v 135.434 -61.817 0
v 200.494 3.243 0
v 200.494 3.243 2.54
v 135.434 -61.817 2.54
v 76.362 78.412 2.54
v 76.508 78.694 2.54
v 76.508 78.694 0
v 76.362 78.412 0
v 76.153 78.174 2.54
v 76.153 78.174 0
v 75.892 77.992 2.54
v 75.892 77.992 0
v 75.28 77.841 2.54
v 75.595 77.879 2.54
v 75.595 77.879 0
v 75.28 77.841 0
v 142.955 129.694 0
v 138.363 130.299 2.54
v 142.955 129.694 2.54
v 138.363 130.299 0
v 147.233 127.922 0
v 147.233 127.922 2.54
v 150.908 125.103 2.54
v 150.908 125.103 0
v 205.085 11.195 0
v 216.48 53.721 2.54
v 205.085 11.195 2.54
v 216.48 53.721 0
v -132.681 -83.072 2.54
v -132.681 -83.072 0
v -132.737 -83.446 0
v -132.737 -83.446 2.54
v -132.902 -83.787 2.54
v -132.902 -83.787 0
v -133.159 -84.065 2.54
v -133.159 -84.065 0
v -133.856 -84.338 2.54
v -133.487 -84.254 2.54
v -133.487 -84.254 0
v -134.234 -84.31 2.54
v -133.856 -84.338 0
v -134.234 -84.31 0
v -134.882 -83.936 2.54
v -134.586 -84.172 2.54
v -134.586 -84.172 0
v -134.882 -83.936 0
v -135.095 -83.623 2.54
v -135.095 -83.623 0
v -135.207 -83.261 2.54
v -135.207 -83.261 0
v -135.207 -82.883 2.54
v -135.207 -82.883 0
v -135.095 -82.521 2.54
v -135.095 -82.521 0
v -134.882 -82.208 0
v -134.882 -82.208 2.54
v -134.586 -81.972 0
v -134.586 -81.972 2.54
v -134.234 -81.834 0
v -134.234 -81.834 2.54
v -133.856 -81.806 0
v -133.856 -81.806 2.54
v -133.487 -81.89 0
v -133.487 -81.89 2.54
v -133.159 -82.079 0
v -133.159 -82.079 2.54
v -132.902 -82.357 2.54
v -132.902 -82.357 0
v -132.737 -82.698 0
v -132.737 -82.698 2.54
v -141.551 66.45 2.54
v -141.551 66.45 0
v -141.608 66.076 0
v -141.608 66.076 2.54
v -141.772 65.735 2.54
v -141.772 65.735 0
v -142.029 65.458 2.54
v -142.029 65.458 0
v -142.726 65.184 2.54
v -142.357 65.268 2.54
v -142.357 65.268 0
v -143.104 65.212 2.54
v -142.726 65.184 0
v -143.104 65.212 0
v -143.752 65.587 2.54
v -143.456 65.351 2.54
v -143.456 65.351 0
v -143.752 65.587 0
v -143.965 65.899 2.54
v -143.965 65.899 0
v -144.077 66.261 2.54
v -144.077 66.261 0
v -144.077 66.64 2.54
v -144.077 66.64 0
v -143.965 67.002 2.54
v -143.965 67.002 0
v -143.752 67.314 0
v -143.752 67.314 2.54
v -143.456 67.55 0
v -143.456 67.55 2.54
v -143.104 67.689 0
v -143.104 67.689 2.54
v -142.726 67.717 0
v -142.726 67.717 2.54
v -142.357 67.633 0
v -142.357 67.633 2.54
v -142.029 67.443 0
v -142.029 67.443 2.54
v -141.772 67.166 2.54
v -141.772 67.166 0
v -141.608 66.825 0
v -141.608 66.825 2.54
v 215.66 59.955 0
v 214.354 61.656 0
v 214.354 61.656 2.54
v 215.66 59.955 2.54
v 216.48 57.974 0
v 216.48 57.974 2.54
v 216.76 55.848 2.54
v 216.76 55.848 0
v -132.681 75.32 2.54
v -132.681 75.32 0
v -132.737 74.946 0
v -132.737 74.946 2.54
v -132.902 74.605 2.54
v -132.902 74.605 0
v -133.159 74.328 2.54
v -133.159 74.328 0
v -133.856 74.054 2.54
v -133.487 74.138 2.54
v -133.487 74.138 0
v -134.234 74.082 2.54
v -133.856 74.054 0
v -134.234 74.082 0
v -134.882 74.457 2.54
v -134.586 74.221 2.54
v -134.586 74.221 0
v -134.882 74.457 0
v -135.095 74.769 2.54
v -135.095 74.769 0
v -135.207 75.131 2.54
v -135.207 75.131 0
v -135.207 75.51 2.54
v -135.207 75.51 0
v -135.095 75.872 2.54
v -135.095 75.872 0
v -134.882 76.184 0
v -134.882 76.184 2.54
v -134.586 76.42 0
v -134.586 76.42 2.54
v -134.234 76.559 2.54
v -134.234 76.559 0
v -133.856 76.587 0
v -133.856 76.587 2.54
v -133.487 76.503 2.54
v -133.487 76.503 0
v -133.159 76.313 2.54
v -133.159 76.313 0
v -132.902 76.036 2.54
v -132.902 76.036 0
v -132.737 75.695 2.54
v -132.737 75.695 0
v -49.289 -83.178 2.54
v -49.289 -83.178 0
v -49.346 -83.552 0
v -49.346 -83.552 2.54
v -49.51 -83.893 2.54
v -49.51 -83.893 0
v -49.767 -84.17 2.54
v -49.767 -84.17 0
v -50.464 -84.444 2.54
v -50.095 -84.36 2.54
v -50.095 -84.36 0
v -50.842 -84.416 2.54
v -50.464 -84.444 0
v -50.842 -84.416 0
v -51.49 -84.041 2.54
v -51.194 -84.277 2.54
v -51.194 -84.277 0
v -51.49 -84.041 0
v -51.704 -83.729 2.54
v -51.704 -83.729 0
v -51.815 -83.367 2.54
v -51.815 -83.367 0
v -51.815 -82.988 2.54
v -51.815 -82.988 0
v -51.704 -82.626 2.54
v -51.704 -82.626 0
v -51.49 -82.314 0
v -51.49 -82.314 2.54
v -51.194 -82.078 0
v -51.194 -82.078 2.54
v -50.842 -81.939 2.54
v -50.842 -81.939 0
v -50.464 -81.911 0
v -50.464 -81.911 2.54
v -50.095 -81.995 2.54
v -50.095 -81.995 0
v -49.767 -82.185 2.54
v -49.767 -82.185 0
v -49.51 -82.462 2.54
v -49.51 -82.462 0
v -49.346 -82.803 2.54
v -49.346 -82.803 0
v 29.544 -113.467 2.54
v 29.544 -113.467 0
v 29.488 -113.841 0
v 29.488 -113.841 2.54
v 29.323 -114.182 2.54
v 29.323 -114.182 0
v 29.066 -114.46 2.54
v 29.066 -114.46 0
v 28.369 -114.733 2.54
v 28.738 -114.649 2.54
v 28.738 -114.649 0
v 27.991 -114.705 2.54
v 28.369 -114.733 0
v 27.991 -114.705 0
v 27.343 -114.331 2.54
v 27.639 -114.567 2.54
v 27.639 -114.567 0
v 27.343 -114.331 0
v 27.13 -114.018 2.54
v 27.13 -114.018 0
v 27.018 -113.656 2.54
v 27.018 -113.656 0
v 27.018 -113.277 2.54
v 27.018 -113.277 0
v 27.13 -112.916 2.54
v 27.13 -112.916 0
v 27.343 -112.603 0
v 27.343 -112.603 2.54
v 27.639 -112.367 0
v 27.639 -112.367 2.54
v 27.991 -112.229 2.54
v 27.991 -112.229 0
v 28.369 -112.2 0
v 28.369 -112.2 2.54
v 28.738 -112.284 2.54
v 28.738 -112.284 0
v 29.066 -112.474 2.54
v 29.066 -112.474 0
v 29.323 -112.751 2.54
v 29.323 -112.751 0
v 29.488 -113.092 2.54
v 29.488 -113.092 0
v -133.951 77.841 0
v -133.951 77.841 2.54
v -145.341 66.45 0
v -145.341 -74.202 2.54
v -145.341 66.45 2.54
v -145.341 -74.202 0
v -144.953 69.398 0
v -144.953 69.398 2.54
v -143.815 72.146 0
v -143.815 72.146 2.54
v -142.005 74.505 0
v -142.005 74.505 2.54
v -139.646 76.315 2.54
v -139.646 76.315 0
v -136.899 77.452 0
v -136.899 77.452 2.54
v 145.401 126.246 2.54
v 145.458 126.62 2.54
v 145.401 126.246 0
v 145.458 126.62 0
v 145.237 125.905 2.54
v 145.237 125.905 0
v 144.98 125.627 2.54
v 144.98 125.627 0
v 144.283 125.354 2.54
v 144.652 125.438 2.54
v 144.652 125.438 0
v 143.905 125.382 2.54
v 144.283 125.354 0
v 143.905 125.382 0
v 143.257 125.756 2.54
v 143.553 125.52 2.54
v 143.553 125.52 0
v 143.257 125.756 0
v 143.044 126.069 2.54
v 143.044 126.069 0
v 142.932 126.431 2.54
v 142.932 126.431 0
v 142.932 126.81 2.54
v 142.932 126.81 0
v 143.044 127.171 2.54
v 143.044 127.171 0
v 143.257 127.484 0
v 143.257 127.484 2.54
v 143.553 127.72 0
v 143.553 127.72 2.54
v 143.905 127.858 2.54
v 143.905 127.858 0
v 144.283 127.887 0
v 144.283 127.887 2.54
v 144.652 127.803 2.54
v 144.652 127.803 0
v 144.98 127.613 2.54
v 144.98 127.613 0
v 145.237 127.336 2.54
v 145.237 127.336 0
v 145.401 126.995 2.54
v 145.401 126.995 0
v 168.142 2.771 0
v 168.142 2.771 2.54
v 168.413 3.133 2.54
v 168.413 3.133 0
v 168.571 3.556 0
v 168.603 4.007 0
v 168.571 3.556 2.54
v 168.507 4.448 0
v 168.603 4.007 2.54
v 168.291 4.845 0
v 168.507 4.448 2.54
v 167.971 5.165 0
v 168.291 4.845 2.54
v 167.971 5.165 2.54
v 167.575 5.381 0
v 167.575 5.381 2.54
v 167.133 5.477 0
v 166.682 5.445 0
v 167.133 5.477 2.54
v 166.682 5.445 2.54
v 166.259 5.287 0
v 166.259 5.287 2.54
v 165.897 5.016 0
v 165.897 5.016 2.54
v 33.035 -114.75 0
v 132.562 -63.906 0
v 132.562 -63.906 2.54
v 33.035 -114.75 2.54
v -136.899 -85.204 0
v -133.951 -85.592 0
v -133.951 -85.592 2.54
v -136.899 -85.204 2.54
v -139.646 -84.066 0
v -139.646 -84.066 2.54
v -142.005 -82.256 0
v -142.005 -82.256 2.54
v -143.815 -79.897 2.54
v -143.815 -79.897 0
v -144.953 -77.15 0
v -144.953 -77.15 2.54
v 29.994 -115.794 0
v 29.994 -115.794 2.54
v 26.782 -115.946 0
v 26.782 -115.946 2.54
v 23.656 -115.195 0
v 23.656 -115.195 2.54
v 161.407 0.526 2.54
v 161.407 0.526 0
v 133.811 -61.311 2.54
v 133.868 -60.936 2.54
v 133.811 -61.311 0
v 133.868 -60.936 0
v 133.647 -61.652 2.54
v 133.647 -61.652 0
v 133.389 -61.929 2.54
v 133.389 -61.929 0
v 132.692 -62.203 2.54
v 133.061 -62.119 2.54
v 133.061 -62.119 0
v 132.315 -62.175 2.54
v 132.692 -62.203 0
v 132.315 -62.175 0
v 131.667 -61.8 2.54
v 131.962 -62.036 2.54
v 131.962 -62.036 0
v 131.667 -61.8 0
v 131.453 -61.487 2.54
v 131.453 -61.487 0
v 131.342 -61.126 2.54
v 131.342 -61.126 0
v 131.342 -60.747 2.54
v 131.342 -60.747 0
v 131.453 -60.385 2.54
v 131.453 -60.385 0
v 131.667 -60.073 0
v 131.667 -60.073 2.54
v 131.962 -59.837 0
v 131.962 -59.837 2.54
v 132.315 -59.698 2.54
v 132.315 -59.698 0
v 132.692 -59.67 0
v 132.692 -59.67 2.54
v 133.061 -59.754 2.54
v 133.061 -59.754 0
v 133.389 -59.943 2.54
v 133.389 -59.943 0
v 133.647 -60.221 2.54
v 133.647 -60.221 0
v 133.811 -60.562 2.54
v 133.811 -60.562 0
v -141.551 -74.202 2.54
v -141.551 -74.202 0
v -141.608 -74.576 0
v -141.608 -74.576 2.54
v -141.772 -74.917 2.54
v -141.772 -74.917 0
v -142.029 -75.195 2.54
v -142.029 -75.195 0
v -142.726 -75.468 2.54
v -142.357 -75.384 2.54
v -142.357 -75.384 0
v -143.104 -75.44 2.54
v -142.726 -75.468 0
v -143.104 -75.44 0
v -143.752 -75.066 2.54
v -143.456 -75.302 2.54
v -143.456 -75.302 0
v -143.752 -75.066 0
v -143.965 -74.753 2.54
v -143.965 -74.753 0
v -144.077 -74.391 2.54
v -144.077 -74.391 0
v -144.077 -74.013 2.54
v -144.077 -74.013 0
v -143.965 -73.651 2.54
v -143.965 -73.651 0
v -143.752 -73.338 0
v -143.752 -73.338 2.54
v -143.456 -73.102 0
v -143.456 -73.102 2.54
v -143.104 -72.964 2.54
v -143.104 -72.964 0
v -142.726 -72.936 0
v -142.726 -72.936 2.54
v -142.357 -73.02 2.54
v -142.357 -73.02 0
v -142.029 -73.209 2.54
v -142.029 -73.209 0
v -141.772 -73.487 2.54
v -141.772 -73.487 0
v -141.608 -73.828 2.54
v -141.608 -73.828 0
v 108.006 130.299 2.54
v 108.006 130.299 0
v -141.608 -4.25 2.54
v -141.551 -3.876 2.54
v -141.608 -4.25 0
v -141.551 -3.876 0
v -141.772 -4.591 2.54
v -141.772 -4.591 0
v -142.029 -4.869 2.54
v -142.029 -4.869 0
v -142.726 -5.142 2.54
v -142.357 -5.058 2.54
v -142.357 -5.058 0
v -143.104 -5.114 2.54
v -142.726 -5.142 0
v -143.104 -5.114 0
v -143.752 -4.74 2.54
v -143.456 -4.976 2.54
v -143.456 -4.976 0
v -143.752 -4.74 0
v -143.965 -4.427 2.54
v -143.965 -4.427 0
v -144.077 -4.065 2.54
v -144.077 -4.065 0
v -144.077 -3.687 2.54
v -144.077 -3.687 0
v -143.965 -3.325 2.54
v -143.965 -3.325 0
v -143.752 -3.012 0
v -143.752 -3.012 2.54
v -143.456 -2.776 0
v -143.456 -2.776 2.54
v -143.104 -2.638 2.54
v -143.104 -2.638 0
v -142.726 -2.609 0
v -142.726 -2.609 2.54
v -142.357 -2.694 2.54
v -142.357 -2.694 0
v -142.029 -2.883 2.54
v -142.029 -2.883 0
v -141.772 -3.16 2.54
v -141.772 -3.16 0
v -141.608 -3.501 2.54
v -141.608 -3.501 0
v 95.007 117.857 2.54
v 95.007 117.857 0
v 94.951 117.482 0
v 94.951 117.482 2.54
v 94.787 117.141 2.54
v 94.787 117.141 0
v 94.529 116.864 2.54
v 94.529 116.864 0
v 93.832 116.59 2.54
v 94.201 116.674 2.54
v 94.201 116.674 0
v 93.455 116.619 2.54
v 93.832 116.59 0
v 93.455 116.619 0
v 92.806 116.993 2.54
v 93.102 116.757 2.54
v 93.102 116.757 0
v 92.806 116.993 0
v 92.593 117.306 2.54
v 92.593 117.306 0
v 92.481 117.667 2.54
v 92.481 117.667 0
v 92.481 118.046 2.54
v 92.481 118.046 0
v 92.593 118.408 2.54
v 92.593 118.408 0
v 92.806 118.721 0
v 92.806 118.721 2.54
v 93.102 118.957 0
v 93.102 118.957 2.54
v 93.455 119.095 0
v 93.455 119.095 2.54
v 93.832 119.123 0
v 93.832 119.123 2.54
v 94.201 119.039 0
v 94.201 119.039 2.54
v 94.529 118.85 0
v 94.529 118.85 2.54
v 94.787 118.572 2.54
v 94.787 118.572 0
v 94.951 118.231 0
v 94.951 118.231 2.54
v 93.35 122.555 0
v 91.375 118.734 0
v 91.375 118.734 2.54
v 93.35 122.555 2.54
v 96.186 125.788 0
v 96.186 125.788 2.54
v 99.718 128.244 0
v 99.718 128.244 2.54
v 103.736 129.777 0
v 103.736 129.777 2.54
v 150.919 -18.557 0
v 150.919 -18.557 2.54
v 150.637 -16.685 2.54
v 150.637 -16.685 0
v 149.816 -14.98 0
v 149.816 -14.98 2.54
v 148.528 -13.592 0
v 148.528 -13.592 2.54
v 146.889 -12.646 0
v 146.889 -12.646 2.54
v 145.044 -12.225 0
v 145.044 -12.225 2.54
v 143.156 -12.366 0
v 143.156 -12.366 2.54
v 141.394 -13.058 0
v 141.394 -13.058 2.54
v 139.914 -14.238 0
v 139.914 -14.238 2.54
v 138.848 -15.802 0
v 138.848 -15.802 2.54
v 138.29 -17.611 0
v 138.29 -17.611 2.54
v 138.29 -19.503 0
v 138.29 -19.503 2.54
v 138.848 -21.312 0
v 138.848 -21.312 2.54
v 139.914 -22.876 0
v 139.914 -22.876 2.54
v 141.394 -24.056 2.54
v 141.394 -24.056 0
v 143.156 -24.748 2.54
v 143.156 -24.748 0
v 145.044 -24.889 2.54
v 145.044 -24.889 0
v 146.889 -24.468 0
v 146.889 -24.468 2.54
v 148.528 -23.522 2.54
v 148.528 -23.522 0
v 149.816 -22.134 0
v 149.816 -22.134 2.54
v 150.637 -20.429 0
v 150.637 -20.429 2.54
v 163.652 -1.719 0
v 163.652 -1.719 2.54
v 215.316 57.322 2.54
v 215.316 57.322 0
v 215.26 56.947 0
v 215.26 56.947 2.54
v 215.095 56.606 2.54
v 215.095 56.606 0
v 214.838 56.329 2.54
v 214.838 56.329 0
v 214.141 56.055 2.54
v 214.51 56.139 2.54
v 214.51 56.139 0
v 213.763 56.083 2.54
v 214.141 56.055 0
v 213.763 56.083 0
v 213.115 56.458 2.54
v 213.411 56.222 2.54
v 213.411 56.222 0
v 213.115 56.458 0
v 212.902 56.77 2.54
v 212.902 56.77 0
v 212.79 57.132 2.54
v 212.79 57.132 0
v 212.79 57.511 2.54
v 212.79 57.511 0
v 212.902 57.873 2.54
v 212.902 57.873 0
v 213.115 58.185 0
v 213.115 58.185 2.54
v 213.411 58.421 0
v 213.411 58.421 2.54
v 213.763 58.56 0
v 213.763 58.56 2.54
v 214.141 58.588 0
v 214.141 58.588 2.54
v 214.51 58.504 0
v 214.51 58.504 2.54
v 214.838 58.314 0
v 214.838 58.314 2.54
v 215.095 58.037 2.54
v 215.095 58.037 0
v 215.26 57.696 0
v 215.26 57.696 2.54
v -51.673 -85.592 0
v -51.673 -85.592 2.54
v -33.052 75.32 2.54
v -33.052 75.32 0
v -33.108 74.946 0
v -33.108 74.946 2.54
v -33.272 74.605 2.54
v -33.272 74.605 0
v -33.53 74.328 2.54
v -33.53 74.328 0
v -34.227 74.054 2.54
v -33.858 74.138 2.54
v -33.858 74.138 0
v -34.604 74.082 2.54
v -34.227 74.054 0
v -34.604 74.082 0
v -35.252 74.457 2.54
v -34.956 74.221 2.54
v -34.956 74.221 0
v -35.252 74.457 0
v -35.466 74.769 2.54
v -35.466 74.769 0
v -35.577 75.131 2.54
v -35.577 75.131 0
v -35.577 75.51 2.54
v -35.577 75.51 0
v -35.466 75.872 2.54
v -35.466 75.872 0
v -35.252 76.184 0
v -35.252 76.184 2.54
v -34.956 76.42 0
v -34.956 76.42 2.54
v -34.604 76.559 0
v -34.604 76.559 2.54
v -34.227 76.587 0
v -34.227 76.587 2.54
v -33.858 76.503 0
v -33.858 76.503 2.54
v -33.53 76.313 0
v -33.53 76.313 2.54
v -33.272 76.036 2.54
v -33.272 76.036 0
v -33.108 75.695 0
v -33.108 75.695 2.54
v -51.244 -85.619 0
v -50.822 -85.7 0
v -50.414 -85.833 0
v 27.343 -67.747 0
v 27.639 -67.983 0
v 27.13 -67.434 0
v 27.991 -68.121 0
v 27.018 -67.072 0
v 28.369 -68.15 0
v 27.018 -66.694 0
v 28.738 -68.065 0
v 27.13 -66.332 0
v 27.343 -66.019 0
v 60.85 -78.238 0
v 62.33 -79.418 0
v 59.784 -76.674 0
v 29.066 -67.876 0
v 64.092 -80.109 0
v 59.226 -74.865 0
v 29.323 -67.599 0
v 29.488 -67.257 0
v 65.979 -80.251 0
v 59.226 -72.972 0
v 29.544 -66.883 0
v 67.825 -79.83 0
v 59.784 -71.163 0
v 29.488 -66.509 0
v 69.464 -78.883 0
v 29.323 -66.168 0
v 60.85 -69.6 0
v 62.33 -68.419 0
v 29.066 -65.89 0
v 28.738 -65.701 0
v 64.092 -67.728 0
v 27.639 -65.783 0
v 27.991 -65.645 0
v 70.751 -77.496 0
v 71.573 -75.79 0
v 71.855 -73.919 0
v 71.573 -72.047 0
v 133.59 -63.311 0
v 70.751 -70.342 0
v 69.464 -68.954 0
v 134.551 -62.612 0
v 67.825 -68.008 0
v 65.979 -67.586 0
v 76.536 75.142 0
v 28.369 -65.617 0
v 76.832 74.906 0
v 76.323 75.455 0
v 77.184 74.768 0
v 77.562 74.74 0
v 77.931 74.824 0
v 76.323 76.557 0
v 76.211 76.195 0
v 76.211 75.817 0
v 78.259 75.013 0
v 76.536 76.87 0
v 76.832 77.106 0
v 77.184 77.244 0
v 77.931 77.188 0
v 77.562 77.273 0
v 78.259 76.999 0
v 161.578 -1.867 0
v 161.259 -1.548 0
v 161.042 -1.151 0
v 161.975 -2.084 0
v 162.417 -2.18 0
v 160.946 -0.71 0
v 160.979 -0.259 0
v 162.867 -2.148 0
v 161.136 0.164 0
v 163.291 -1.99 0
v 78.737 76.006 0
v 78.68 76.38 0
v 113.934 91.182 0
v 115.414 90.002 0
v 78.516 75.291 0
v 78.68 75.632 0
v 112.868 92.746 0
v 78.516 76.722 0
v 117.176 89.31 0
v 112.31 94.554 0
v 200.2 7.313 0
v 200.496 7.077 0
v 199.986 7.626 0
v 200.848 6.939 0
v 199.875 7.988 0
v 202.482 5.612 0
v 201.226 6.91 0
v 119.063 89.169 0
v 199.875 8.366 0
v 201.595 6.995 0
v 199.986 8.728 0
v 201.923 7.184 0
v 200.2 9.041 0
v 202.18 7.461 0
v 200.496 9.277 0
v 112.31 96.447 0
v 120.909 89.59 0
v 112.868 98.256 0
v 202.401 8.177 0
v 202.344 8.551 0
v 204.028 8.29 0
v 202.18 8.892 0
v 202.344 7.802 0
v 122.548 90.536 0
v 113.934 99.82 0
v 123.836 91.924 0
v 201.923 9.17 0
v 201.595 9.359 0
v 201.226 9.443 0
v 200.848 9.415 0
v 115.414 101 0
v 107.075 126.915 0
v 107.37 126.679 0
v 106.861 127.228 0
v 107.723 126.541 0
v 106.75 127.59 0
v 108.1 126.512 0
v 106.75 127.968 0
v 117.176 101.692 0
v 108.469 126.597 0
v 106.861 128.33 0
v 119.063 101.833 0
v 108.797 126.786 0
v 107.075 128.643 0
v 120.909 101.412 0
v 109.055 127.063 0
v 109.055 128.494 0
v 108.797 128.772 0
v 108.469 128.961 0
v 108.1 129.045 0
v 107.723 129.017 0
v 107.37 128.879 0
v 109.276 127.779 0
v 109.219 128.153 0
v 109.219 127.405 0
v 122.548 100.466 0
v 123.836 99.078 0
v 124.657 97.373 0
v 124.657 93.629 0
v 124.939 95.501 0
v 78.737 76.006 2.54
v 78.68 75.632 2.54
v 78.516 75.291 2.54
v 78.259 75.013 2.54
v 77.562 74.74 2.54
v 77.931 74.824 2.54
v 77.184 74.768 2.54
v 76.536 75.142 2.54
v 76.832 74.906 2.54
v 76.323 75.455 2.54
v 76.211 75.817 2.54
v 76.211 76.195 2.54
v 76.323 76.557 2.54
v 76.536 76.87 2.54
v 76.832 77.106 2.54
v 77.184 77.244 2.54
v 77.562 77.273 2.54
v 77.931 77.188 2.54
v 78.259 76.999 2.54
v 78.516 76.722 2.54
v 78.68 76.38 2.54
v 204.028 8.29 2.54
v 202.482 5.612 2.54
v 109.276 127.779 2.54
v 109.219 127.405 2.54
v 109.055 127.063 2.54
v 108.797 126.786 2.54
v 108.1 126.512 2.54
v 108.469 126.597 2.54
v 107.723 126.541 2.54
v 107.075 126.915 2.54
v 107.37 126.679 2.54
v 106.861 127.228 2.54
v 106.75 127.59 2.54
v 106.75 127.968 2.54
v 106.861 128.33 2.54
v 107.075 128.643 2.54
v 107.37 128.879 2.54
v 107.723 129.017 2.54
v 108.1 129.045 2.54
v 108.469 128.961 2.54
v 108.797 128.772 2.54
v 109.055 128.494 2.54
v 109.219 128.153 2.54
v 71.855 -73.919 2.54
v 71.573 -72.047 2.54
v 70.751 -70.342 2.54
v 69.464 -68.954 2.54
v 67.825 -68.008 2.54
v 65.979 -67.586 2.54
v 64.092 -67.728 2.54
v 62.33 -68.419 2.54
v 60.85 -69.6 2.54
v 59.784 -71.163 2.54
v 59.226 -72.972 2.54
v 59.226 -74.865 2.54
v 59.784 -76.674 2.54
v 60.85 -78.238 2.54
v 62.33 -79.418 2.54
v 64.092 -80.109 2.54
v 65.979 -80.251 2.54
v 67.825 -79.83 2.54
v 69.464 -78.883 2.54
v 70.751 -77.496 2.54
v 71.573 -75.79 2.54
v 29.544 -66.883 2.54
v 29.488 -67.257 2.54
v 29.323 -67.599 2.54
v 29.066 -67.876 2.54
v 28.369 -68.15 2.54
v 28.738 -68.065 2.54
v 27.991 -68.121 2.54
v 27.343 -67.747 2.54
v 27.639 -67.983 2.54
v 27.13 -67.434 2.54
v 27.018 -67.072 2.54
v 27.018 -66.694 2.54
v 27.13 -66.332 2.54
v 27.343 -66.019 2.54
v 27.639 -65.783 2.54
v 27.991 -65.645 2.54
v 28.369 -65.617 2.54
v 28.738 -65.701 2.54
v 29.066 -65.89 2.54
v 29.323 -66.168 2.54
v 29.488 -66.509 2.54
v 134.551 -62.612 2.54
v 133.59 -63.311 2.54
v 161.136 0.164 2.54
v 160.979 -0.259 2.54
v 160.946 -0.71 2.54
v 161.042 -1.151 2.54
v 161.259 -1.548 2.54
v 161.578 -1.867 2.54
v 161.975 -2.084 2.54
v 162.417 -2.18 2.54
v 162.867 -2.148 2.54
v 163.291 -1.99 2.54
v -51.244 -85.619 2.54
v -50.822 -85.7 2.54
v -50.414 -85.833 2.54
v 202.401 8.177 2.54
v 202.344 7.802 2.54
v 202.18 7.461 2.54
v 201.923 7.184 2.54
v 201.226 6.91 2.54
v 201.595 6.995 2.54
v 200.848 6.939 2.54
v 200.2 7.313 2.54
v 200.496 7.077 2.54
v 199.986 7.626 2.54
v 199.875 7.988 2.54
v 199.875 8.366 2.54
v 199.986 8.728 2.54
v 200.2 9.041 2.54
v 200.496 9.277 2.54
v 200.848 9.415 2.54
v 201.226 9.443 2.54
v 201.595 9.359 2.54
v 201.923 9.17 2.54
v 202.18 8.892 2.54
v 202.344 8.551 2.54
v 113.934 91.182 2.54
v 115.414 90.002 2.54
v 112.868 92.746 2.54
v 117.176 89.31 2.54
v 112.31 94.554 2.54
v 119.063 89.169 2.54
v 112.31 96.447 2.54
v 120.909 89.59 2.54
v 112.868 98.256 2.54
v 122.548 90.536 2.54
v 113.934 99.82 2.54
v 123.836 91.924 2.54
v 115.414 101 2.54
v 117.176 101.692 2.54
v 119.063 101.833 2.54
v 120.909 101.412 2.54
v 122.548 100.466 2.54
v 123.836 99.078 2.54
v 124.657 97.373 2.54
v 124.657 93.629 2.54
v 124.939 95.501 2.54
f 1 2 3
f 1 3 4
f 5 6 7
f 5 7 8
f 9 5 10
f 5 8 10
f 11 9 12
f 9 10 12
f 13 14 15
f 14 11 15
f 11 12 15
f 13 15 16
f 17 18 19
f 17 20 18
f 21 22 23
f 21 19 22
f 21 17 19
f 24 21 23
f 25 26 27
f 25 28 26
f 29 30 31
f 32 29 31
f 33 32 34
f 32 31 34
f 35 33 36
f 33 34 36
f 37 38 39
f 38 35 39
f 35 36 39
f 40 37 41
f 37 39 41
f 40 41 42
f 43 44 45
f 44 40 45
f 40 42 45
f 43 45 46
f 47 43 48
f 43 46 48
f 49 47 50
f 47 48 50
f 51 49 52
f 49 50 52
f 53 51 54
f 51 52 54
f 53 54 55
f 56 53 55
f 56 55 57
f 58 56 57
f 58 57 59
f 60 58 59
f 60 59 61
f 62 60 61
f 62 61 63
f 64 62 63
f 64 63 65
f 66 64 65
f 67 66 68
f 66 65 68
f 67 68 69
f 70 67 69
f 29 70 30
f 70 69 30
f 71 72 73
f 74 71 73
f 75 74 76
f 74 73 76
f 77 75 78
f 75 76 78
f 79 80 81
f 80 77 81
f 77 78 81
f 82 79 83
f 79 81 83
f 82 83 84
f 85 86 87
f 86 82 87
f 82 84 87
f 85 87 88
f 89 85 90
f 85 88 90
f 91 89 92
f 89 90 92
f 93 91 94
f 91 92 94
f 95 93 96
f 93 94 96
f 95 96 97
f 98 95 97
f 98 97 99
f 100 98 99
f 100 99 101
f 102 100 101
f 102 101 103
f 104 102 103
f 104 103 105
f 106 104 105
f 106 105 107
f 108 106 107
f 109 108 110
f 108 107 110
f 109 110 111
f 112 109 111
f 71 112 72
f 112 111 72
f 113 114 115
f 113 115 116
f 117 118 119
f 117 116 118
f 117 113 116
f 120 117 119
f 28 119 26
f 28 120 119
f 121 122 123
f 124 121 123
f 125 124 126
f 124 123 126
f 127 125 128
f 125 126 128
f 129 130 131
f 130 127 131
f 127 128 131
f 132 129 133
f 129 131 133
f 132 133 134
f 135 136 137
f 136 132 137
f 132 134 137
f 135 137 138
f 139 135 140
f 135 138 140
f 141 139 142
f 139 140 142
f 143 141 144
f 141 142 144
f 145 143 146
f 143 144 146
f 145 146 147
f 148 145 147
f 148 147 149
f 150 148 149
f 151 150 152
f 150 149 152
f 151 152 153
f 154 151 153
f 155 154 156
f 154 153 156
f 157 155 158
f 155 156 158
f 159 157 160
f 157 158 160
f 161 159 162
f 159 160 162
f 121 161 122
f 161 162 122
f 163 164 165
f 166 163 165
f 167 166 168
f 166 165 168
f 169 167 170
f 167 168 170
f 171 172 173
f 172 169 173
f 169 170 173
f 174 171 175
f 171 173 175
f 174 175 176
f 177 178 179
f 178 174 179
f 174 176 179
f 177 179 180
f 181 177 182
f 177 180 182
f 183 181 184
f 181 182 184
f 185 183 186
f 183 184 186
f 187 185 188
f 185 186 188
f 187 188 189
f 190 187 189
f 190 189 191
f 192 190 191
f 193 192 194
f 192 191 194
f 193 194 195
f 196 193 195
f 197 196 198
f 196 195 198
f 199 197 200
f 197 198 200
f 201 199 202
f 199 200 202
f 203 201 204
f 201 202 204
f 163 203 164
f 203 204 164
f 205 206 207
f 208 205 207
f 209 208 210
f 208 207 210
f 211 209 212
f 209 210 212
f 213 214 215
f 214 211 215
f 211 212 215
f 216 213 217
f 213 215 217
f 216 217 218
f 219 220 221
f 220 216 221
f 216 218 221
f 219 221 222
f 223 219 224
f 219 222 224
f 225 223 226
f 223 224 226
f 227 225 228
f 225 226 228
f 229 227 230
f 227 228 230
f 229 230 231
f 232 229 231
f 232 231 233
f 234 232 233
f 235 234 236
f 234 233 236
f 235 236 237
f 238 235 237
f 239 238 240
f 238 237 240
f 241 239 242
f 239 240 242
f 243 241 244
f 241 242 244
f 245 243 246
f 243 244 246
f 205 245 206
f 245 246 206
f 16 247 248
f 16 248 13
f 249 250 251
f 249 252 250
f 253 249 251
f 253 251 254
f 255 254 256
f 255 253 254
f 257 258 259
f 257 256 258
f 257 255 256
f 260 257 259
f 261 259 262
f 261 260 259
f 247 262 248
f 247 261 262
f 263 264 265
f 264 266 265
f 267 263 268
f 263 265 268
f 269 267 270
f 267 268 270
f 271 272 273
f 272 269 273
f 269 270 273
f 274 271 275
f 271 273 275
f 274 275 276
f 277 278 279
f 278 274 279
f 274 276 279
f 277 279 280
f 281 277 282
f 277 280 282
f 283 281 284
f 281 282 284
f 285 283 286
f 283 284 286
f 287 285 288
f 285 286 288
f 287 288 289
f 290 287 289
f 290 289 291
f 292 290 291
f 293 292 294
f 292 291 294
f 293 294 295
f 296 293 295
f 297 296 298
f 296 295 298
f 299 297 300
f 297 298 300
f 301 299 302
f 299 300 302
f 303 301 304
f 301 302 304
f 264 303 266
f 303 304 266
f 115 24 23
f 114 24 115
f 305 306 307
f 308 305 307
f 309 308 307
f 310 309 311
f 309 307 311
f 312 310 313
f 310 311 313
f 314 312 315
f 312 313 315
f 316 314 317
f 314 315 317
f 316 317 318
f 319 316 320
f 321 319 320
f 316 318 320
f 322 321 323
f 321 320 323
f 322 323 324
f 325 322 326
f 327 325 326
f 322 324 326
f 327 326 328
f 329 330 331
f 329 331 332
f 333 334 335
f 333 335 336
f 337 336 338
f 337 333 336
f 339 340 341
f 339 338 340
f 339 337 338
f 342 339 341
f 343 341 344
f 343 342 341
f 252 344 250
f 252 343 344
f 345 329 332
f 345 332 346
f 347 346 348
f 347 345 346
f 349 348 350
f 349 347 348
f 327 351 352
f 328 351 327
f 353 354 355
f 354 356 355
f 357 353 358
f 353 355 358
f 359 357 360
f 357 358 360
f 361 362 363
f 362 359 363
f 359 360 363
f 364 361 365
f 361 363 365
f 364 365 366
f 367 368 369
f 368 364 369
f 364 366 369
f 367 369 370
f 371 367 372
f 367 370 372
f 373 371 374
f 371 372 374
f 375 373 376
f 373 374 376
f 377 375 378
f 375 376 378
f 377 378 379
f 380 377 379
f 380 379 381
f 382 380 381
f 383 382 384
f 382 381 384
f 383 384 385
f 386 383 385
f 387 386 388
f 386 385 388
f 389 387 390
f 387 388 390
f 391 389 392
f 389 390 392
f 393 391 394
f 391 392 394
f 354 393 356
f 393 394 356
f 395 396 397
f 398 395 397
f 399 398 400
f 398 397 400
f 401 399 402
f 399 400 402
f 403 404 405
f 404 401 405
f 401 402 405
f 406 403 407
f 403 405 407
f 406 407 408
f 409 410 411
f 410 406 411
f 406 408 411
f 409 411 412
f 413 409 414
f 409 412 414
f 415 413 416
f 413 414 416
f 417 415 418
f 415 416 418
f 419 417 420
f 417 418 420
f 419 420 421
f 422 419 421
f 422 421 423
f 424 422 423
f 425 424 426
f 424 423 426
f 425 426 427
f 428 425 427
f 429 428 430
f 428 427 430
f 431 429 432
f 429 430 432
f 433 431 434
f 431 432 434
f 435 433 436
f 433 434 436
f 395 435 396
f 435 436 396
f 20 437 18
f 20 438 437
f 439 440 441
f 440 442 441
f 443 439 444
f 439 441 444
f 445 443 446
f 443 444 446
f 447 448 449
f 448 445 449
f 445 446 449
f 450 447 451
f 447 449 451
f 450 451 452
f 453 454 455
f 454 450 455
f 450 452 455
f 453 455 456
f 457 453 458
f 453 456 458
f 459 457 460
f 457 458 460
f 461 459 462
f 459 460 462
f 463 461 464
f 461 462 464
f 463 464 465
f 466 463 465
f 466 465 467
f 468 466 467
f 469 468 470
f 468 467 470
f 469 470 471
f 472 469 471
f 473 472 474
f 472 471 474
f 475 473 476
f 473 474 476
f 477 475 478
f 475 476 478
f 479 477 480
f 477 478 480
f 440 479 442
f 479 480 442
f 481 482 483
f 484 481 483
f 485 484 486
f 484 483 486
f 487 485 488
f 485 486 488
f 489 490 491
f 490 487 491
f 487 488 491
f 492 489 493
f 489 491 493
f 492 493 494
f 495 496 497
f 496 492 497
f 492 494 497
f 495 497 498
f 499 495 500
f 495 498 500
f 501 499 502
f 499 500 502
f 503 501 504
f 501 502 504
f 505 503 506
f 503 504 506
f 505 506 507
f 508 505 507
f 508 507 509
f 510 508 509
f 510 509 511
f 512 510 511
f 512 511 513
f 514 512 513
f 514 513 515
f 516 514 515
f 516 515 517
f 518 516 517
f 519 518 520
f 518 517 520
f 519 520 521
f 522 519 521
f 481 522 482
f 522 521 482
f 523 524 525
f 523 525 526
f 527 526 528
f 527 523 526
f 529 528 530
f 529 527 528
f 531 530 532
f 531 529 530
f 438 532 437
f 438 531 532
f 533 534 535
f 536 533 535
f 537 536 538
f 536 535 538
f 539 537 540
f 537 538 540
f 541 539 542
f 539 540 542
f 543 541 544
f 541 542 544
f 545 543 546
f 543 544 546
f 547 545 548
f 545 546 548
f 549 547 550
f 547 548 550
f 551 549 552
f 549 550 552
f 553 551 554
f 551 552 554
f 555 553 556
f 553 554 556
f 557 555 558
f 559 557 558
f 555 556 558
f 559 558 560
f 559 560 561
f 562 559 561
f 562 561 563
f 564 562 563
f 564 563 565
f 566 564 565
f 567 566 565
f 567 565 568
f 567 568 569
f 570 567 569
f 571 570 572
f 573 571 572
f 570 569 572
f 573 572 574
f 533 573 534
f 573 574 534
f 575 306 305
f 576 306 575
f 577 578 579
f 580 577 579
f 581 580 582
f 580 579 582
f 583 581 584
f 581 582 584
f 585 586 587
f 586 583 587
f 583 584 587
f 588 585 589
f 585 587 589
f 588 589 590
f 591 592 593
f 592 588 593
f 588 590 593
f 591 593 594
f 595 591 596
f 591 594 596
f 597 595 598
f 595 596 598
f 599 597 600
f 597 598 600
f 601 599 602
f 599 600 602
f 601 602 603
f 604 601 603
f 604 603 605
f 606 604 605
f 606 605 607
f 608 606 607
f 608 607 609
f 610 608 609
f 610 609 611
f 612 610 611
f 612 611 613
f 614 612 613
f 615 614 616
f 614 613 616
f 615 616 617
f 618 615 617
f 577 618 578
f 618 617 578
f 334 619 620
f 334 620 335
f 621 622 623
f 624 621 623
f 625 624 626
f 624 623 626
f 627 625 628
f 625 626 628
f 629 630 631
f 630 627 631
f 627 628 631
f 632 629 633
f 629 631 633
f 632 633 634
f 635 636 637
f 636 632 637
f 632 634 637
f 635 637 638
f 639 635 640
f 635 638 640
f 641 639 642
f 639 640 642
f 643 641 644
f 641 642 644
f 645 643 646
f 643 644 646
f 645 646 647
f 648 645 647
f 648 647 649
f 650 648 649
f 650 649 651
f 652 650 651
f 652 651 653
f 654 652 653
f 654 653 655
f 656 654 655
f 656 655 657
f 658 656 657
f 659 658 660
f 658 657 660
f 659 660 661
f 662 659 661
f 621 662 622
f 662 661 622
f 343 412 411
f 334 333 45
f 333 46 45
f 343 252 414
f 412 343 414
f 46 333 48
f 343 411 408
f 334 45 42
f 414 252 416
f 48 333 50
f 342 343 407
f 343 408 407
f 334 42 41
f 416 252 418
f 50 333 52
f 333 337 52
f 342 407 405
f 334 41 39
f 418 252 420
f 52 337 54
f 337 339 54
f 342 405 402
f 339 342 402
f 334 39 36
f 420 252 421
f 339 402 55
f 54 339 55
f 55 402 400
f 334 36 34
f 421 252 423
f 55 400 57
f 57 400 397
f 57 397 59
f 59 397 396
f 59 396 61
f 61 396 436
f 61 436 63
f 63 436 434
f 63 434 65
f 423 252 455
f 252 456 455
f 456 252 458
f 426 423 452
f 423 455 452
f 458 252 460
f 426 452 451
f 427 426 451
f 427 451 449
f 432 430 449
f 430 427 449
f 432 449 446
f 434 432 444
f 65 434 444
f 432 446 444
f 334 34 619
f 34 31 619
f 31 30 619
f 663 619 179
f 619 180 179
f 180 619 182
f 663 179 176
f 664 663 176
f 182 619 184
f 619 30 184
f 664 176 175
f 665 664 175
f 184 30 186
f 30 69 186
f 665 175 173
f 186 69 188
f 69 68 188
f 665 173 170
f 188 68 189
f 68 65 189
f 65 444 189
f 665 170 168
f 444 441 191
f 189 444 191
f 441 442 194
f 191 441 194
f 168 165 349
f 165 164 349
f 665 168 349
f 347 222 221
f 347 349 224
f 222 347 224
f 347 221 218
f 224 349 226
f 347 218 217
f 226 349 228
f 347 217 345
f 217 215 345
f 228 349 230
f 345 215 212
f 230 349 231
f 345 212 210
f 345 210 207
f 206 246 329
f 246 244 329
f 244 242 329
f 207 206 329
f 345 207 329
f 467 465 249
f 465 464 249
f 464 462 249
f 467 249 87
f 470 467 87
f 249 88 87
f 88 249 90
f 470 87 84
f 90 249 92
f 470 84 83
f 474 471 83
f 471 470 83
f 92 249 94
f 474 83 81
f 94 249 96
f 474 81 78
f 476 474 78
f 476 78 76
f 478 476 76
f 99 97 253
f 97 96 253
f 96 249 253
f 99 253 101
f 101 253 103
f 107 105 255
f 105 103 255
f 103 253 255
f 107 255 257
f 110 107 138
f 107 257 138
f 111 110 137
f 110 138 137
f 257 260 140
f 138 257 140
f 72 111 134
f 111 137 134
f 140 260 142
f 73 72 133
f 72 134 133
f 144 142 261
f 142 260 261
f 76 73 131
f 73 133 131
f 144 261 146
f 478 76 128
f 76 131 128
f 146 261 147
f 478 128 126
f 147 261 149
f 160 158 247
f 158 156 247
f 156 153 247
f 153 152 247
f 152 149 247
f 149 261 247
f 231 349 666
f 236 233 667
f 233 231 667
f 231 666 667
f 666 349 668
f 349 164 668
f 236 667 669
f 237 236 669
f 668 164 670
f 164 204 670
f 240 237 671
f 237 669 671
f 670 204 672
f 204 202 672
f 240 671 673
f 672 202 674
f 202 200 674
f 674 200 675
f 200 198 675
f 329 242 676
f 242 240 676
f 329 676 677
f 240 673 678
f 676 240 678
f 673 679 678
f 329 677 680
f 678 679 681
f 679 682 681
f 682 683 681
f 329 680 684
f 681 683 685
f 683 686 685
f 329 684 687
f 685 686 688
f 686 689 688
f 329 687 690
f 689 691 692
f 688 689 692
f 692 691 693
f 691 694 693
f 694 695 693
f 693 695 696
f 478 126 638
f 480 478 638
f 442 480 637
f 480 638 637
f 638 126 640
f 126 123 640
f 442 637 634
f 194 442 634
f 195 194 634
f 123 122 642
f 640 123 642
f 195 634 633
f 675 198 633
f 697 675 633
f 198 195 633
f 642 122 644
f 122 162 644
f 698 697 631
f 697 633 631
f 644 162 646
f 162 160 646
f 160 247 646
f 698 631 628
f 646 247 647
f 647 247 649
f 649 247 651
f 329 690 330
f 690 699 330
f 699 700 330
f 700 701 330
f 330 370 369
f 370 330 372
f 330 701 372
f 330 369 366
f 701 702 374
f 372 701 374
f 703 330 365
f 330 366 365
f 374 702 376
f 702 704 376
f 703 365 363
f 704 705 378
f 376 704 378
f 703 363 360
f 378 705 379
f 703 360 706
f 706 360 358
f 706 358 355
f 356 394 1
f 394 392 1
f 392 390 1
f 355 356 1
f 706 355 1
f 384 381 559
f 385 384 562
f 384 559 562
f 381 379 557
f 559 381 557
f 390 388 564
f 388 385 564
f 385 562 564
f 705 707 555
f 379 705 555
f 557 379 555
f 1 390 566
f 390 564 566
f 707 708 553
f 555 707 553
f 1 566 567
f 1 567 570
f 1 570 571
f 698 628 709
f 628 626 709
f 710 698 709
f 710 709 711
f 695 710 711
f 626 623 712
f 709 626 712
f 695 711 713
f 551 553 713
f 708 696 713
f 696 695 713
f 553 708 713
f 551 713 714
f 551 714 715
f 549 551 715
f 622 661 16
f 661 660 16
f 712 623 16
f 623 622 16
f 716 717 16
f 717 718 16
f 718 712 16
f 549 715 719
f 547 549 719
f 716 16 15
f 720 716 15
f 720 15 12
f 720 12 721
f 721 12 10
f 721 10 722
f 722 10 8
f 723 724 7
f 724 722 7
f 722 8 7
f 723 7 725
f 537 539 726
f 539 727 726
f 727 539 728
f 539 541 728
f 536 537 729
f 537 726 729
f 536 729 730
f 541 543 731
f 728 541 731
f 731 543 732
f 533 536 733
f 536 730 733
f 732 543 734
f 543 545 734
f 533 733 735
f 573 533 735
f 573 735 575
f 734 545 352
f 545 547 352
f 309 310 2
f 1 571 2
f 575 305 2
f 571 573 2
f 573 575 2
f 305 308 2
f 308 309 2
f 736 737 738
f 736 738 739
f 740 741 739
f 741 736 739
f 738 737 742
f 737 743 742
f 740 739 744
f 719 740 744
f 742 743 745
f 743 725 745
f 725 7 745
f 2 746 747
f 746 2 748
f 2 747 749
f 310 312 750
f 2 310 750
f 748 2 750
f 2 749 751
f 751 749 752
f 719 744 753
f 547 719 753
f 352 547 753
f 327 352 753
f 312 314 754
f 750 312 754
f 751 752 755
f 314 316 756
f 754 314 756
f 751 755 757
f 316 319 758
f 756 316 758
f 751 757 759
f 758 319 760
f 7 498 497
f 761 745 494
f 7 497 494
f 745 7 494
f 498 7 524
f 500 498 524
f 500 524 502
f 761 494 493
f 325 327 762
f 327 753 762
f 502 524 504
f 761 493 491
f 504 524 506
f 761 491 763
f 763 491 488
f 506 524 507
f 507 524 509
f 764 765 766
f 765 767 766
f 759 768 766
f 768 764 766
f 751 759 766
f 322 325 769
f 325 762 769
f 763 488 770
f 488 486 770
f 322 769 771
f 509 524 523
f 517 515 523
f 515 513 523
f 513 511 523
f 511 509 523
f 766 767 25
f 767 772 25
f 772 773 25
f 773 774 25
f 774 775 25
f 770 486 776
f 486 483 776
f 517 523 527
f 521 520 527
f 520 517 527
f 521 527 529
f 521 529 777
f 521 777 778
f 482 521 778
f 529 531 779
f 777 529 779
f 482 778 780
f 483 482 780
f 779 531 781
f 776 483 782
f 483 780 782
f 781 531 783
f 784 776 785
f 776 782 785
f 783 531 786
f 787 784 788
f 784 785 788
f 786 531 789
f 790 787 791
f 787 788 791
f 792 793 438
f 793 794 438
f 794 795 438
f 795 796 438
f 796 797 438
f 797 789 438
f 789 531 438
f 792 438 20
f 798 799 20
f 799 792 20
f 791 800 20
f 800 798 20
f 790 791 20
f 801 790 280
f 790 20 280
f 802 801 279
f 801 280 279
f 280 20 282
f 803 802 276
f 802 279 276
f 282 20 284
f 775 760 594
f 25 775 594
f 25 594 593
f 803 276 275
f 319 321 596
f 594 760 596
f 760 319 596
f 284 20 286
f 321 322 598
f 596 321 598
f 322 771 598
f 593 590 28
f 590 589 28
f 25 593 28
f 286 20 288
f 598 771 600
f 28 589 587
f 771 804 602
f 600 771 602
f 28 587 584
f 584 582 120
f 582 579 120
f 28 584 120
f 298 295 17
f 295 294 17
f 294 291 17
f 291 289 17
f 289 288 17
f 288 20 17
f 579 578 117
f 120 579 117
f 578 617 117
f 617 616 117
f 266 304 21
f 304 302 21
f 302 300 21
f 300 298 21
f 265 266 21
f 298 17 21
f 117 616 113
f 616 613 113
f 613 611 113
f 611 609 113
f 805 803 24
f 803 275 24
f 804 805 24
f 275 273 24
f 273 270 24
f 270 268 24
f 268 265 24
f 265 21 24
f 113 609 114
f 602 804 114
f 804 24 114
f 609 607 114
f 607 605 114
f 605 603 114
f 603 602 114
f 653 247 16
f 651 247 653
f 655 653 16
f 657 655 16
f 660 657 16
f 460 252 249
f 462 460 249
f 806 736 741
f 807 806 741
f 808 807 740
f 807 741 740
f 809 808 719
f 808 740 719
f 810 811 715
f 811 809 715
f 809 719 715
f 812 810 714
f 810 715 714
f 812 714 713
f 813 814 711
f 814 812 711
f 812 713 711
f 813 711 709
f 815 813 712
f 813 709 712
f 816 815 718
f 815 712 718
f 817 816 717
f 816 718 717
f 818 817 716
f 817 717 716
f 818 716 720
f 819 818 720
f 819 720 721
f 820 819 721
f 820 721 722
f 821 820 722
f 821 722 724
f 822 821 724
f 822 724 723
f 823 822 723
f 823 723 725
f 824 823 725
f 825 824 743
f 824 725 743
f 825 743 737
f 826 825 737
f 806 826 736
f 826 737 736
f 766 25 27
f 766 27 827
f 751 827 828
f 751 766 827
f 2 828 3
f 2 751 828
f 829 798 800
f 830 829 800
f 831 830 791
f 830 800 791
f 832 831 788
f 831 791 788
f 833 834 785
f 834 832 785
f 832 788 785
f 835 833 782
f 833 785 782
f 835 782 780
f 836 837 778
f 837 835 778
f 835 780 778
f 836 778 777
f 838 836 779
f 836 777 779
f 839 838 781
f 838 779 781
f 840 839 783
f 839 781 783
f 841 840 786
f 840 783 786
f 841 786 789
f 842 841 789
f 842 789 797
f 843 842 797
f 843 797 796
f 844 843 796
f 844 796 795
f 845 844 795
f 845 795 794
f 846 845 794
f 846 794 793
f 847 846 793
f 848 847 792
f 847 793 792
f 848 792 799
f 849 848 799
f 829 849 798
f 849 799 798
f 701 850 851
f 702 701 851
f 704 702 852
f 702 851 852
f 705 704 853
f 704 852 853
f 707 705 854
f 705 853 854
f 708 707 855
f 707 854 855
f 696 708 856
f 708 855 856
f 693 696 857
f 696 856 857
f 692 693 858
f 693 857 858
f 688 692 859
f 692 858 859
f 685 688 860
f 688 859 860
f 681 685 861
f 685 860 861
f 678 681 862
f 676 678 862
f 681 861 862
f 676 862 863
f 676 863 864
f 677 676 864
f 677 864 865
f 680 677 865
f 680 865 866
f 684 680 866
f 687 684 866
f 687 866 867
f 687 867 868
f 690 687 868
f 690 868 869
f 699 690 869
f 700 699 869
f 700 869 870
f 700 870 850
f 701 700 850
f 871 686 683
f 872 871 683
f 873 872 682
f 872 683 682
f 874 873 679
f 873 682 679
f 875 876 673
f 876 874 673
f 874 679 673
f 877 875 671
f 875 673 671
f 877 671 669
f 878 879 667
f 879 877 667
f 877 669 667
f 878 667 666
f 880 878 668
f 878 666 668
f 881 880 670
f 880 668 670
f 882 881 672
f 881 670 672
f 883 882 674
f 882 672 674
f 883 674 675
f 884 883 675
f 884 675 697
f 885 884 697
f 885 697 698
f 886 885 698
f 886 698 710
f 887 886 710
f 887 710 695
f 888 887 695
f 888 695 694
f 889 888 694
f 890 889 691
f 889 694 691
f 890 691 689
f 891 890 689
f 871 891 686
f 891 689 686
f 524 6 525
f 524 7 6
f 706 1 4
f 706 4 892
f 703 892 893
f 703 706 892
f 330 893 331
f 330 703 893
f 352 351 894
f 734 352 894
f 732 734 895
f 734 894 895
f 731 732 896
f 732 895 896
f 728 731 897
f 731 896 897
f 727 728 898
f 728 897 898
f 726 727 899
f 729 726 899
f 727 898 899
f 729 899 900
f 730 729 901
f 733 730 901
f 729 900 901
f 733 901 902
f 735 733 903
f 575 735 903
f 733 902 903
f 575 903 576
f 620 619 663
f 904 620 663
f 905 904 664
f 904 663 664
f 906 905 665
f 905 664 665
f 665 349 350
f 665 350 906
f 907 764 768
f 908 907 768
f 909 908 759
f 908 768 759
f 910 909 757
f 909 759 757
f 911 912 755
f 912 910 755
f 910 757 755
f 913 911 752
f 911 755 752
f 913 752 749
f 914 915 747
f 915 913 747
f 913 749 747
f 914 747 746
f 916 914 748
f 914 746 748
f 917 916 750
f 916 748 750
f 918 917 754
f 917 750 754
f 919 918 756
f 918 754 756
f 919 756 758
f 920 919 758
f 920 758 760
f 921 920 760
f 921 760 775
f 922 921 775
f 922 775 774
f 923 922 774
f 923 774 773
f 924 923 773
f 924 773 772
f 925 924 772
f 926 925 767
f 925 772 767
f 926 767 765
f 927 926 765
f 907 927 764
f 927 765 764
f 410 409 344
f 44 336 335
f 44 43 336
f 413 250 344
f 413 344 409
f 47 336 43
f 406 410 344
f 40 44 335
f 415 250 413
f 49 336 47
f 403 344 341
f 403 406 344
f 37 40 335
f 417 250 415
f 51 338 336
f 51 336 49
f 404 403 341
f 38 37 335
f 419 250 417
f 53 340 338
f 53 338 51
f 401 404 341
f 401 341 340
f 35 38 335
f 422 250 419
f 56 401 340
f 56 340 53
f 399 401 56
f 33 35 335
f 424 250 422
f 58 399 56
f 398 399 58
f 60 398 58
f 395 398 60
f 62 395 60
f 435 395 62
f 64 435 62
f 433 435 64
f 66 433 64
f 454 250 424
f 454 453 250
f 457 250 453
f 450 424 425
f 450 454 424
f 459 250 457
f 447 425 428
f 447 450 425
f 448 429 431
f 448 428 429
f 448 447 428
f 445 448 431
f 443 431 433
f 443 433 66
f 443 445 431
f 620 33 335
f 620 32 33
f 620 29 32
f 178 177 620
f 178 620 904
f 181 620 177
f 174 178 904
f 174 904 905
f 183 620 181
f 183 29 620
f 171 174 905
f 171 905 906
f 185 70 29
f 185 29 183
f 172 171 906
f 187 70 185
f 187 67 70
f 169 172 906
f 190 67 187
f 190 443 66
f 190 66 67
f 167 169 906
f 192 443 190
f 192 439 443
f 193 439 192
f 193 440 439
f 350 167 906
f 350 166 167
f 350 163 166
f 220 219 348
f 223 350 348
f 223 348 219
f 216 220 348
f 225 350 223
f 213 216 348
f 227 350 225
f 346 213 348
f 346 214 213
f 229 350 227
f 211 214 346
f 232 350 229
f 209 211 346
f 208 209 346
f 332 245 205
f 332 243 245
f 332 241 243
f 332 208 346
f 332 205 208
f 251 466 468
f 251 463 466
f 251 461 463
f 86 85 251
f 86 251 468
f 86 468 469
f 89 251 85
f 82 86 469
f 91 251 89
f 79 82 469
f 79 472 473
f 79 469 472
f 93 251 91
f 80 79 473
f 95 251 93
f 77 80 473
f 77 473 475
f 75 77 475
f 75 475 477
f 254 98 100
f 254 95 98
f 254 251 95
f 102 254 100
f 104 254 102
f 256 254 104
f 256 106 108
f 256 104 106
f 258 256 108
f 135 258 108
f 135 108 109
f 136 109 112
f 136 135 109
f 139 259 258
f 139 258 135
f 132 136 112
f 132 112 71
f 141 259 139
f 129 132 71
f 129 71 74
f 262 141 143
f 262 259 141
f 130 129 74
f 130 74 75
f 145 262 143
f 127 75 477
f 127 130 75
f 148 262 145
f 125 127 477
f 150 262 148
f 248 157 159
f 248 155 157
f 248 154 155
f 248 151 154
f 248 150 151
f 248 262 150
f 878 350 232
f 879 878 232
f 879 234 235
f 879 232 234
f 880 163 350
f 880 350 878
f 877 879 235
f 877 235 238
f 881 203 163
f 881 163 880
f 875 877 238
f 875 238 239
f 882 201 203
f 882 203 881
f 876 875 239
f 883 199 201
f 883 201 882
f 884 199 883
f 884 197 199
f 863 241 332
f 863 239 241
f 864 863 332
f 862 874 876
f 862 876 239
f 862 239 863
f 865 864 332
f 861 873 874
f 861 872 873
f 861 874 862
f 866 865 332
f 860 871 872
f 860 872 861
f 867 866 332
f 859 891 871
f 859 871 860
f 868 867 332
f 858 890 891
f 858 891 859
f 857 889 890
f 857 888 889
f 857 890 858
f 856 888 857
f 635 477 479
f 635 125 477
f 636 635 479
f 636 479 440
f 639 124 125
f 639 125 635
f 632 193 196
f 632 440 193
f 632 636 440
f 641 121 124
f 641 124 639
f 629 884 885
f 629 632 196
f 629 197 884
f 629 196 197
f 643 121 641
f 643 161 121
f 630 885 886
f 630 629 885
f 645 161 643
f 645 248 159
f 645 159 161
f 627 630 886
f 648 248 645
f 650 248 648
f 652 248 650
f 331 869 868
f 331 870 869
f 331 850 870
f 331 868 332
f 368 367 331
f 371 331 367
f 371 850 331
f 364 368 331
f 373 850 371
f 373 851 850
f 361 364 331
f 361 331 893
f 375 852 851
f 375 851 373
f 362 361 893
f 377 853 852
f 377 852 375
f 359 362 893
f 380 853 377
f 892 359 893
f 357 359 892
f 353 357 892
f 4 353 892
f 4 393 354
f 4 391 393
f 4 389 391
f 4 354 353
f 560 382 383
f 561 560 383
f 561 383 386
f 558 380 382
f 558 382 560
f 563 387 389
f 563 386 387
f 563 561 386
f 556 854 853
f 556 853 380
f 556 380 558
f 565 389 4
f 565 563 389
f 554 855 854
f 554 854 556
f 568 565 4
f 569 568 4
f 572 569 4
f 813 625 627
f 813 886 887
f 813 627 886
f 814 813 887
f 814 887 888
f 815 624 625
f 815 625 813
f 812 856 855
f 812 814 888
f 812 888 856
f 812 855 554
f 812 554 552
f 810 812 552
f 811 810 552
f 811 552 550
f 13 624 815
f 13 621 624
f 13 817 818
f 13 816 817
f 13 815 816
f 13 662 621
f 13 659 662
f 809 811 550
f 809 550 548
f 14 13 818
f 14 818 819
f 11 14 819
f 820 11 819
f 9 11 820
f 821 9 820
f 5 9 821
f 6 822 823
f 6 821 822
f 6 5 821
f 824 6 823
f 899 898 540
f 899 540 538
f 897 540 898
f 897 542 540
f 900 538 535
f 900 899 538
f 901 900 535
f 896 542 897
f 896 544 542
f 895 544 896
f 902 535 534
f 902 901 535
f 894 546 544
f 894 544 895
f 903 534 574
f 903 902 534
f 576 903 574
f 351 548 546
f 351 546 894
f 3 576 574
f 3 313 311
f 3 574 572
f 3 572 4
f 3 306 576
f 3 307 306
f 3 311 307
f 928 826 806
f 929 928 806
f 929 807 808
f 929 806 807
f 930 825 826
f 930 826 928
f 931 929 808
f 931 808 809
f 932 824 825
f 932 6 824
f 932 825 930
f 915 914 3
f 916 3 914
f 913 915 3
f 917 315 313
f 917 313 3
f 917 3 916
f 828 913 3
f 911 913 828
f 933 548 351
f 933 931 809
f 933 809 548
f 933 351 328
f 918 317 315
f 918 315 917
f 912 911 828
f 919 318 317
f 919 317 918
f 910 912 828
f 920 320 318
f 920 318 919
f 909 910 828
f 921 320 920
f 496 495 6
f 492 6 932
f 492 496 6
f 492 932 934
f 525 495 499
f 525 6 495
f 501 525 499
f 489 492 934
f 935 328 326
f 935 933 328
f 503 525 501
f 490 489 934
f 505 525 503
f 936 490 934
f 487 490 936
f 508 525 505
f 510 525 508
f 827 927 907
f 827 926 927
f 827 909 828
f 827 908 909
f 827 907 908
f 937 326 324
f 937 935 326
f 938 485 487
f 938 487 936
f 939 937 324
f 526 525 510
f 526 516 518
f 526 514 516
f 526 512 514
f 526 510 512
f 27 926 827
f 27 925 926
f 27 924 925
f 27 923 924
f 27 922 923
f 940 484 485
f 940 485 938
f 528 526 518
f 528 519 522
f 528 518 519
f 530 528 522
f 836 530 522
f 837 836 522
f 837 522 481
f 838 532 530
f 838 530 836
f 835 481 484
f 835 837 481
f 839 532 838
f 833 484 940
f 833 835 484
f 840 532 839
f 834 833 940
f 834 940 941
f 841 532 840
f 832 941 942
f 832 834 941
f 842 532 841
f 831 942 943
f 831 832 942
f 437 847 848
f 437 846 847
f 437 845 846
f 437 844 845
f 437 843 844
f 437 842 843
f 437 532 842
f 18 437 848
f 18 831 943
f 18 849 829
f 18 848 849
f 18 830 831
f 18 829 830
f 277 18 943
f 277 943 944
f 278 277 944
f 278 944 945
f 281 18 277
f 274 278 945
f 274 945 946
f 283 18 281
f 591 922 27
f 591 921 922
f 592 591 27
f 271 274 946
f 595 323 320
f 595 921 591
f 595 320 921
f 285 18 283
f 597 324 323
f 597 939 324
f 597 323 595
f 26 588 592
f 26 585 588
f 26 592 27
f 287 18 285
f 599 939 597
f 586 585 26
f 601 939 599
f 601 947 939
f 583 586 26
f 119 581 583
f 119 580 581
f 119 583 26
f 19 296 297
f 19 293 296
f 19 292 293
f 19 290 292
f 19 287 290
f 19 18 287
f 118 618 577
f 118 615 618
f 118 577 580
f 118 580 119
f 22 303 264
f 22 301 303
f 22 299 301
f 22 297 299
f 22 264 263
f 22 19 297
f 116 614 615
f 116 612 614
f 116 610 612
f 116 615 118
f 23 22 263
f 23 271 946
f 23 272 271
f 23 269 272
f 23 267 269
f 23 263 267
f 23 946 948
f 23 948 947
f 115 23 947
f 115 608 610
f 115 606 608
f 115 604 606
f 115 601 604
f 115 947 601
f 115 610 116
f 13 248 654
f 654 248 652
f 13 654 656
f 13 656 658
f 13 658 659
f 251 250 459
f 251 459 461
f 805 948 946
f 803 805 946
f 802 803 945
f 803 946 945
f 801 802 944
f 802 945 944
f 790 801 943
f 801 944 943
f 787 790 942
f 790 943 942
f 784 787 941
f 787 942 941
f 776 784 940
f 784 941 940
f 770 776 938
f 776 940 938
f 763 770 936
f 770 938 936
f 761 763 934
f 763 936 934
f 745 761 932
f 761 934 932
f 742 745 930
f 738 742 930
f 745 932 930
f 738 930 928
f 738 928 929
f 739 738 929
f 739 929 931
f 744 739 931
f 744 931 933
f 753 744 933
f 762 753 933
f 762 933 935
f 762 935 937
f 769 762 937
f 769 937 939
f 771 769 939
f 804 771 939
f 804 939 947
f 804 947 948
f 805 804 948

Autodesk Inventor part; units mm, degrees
ref_plane "YZ Plane" through (0, 0, 0) normal (1, 0, 0) x (0, 1, 0)
ref_plane "XZ Plane" through (0, 0, 0) normal (0, 1, 0) x (-1, 0, 0)
ref_plane "XY Plane" through (0, 0, 0) normal (0, 0, 1) x (1, 0, 0)
sketch "Profile" plane through (0, 0, 0) normal (0, 0, 1) x (1, 0, 0)
  arc A0 (-133.951, 77.8406) -> (-145.3411, 66.4505) centre (-133.951, 66.4505) ccw
  line L0 (-133.951, 77.8406) -> (-53.1048, 77.8406)
  line L1 (-34.3215, 77.8406) -> (75.2802, 77.8406)
  line L2 (-53.1048, 77.8406) -> (-34.3215, 77.8406)
  arc A1 (75.2802, 77.8406) -> (76.5082, 78.6945) centre (75.2802, 79.1505) ccw
  line L3 (76.5082, 78.6945) -> (91.3749, 118.7338)
  arc A2 (108.0055, 130.2989) -> (91.3749, 118.7338) centre (108.0055, 112.5588) ccw
  line L4 (108.0055, 130.2989) -> (138.3634, 130.2989)
  arc A3 (150.9075, 125.103) -> (138.3634, 130.2989) centre (138.3634, 112.5588) ccw
  line L5 (150.9075, 125.103) -> (214.354, 61.6565)
  arc A4 (216.4802, 53.7213) -> (214.354, 61.6565) centre (208.545, 55.8476) ccw
  line L6 (216.4802, 53.7213) -> (205.0854, 11.1954)
  arc A5 (200.4939, 3.2427) -> (205.0854, 11.1954) centre (187.9498, 15.7868) ccw
  line L7 (200.4939, 3.2427) -> (135.4341, -61.8171)
  arc A6 (132.5618, -63.9063) -> (135.4341, -61.8171) centre (127.3801, -53.7631) ccw
  line L8 (132.5618, -63.9063) -> (33.0352, -114.7498)
  arc A7 (23.6561, -115.1951) -> (33.0352, -114.7498) centre (27.8535, -104.6066) ccw
  line L9 (23.6561, -115.1951) -> (-50.4135, -85.8326)
  arc A8 (-50.4135, -85.8326) -> (-51.6732, -85.5921) centre (-51.6732, -89.0102) ccw
  line L10 (-51.6732, -85.5921) -> (-133.951, -85.5921)
  arc A9 (-145.3411, -74.202) -> (-133.951, -85.5921) centre (-133.951, -74.202) ccw
  line L11 (-145.3411, -74.202) -> (-145.3411, 66.4505)
  circle A10 centre (-133.951, 75.3205) radius 1.27
  circle A11 centre (-142.8211, 66.4505) radius 1.27
  circle A12 centre (-34.3215, 75.3205) radius 1.27
  circle A13 centre (77.4668, 76.0061) radius 1.27
  circle A14 centre (93.7373, 117.8567) radius 1.27
  circle A15 centre (108.0055, 127.7789) radius 1.27
  circle A16 centre (144.1878, 126.6203) radius 1.27
  circle A17 centre (214.046, 57.3215) radius 1.27
  circle A18 centre (201.1307, 8.1768) radius 1.27
  circle A19 centre (132.5975, -60.9364) radius 1.27
  circle A20 centre (28.2741, -113.4667) radius 1.27
  circle A21 centre (-50.5593, -83.1775) radius 1.27
  circle A22 centre (-133.951, -83.072) radius 1.27
  circle A23 centre (-142.8211, -74.202) radius 1.27
  circle A24 centre (-142.8211, -3.8758) radius 1.27
  line L12 (28.2741, -113.4667) -> (28.2741, -66.8831) construction
  circle A25 centre (28.2741, -66.8831) radius 1.27
  point P0 (0, 0)
  dimension "d2" = 46.5836
extrude "BaseFeature" add sketch "Profile" along normal blind 2.54
sketch "BatteryMount" plane through (0, 0, 2.54) normal (0, 0, 1) x (1, 0, 0)
  circle A0 centre (118.5889, 95.5009) radius 6.35
  circle A1 centre (118.5889, 95.5009) radius 6.35
  arc A2 (102.7139, 117.5989) -> (99.5389, 114.4239) centre (102.7139, 114.4239) ccw
  line L0 (99.5389, 114.4239) -> (99.5389, 76.5779)
  arc A3 (99.5389, 76.5779) -> (102.7139, 73.4029) centre (102.7139, 76.5779) ccw
  line L1 (102.7139, 73.4029) -> (134.4639, 73.4029)
  arc A4 (134.4639, 73.4029) -> (137.6389, 76.5779) centre (134.4639, 76.5779) ccw
  line L2 (137.6389, 76.5779) -> (137.6389, 114.4239)
  arc A5 (137.6389, 114.4239) -> (134.4639, 117.5989) centre (134.4639, 114.4239) ccw
  line L3 (134.4639, 117.5989) -> (102.7139, 117.5989)
  line L4 (138.3634, 130.2989) -> (108.0055, 130.2989) projected
  point P0 (0, 0)
  dimension "d3" = 37.846
  dimension "d4" = 31.75
  dimension "d5" = 3.175
  dimension "d6" = 12.7
  dimension "d7" = 22.098
  dimension "d8" = 19.05
  dimension "d9" = 12.7
  dimension "d10" = 8.4667
extrude "BatteryMountFeature" cut sketch "BatteryMount" against normal through all contours A0
sketch "Outputs" plane through (0, 0, 2.54) normal (0, 0, 1) x (1, 0, 0)
  circle A0 centre (65.5047, -73.9186) radius 6.35
  circle A1 centre (144.5693, -18.557) radius 6.35
  line L0 (135.4341, -61.8171) -> (200.4939, 3.2427) projected
  line L1 (33.0352, -114.7498) -> (132.5618, -63.9063) construction
  line L2 (144.5693, -18.557) -> (65.5047, -73.9186) construction
  point P0 (0, 0)
  dimension "d13" = 12.7
  dimension "d14" = 24.13
  dimension "d15" = 21.59
  dimension "d16" = 10
  dimension "d17" = 96.52
extrude "OutputHolesFeature" cut sketch "Outputs" against normal through all
sketch "USB-CInput" plane through (0, 0, 2.54) normal (0, 0, 1) x (1, 0, 0)
  circle A0 centre (162.5298, -0.5965) radius 1.5875
  circle A1 centre (167.0199, 3.8937) radius 1.5875
  line L0 (162.5298, -0.5965) -> (167.0199, 3.8937) construction
  line L1 (135.4341, -61.8171) -> (200.4939, 3.2427) construction
  circle A2 centre (144.5693, -18.557) radius 6.35 construction
  line L2 (162.5298, -0.5965) -> (144.5693, -18.557) construction
  line L3 (161.4072, 0.5261) -> (165.8974, 5.0162)
  line L4 (168.1424, 2.7711) -> (163.6523, -1.719)
  point P0 (0, 0)
  dimension "d20" = 3.175
  dimension "d21" = 25.4
  dimension "d22" = 6.35
extrude "USB-CInputFeature" cut sketch "USB-CInput" against normal through all
properties part number "electronics-cover"
